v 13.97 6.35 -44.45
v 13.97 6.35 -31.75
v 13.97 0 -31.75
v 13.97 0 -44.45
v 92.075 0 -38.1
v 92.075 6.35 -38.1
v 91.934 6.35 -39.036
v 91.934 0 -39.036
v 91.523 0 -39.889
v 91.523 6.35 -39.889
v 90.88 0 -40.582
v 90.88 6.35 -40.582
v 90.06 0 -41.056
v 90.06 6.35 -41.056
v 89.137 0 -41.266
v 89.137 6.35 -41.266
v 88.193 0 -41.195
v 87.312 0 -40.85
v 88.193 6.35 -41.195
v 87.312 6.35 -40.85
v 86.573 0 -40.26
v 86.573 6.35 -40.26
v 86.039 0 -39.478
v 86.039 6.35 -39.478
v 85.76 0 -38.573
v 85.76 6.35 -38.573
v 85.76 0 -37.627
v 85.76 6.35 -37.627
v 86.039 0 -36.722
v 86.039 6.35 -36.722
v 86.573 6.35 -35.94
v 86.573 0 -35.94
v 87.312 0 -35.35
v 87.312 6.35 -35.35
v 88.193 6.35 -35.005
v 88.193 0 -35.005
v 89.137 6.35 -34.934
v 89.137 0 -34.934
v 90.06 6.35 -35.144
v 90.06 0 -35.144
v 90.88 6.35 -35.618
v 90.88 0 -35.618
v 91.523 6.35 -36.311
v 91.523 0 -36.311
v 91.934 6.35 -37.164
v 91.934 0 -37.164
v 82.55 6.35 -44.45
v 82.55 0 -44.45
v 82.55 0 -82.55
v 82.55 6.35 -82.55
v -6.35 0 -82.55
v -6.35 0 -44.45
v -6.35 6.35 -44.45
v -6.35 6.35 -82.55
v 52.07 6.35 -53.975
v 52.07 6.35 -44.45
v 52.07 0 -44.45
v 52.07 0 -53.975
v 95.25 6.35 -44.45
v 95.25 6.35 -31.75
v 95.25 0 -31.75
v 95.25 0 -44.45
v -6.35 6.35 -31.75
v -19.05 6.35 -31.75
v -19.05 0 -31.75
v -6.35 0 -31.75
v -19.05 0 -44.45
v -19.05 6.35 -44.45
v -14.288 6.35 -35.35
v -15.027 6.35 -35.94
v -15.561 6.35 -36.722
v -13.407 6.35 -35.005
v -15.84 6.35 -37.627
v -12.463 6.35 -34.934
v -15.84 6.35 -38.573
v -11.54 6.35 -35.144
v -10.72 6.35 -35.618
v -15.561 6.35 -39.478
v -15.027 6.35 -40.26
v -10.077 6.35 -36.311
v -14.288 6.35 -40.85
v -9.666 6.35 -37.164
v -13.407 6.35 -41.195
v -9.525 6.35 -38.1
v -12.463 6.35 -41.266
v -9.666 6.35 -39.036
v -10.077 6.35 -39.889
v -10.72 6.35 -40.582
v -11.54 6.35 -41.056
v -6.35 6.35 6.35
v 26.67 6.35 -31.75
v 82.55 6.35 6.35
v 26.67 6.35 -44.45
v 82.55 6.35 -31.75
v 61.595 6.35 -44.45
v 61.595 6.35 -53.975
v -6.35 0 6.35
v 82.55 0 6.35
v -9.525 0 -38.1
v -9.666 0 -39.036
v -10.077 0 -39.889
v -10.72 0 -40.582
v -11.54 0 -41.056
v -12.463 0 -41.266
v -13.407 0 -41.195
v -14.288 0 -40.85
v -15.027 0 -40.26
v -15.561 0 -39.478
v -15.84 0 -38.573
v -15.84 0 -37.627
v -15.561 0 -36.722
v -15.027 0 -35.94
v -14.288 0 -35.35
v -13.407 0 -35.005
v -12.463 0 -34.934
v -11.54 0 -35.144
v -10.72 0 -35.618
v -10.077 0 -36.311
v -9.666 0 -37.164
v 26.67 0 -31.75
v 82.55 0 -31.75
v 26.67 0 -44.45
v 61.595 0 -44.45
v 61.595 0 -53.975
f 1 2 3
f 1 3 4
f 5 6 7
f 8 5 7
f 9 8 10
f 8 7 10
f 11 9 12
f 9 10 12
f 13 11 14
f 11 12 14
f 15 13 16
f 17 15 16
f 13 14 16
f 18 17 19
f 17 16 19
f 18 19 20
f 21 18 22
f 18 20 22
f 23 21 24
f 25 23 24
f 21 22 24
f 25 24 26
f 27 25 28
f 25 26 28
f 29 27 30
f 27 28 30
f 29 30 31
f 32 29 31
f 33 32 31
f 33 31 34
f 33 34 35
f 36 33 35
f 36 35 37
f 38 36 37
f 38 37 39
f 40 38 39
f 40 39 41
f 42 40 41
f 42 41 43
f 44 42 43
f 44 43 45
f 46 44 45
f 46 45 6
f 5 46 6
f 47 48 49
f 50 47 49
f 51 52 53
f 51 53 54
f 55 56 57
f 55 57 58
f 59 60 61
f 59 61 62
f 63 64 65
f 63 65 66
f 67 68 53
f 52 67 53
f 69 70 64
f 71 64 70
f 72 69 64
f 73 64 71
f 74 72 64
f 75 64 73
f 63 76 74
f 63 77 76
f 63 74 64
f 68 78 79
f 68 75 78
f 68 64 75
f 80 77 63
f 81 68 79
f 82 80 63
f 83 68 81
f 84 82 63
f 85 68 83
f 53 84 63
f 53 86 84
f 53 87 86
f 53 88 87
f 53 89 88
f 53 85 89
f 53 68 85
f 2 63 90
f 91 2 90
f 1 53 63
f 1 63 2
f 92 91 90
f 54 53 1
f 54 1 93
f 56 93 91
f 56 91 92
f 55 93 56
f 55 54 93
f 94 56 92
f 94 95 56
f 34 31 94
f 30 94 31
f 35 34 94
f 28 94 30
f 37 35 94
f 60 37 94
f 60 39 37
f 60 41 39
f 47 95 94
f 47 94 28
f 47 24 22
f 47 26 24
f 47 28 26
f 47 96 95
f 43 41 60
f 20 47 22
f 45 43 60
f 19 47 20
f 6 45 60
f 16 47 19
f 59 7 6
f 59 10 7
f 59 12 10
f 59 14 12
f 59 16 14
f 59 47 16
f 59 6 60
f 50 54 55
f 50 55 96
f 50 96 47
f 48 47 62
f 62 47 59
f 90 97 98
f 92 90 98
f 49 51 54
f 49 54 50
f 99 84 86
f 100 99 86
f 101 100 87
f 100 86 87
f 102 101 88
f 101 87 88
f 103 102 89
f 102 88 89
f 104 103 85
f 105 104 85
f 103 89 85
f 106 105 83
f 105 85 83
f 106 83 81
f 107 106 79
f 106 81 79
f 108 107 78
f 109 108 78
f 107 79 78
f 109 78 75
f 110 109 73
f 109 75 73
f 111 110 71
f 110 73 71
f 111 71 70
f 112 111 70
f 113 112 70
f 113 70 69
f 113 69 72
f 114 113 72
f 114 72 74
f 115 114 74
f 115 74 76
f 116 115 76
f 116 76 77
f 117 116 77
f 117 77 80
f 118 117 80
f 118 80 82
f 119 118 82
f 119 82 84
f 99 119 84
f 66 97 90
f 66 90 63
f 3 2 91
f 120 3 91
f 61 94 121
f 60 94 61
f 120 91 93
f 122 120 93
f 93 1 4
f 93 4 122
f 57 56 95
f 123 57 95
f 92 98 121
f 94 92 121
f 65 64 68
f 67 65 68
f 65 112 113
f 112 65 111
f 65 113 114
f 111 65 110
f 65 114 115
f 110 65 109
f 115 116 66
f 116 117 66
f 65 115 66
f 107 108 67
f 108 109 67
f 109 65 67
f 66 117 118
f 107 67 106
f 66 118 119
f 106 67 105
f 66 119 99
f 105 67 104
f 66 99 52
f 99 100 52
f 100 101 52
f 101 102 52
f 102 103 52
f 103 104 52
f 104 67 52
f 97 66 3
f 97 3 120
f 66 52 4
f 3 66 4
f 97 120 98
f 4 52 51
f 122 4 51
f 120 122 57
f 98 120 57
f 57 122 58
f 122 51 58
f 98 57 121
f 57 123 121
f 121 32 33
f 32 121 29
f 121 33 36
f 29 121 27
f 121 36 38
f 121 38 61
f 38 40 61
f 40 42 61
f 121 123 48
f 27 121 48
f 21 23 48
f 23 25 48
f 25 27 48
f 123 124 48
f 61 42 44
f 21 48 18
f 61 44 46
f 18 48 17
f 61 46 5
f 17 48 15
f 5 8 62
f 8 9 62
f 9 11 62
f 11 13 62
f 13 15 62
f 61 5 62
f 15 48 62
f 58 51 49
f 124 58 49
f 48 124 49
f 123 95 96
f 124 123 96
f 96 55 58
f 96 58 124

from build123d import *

# Parameters (mm, degrees)
SKETCH1_W           = 88.9
SKETCH1_H           = 88.9
BOSS_EXTRUDE1_DEPTH = 6.35
SKETCH3_W           = 12.7
SKETCH3_H           = 12.7
BOSS_EXTRUDE3_DEPTH = 6.35
SKETCH4_R           = 3.175
CUT_EXTRUDE1_DEPTH  = 7.35
SKETCH6_W           = 12.7
SKETCH6_H           = 12.7
SKETCH6_W_2         = 9.525
SKETCH6_H_2         = 9.525
CUT_EXTRUDE2_DEPTH  = 6.35


with BuildPart() as part:
    # Sketch1 → Boss-Extrude1 (new body)
    with BuildSketch(Plane(origin=(0, 0, 0), x_dir=(1, 0, 0), z_dir=(0, 1, 0))):
        with Locations((38.1, 38.1)):
            Rectangle(SKETCH1_W, SKETCH1_H)
    extrude(amount=BOSS_EXTRUDE1_DEPTH)

    # Sketch3 → Boss-Extrude3 (add)
    with BuildSketch(Plane(origin=(0, 6.35, 0), x_dir=(1, 0, 0), z_dir=(0, 1, 0))):
        with Locations((88.9, 38.1)):
            Rectangle(SKETCH3_W, SKETCH3_H)
        with Locations((-12.7, 38.1)):
            Rectangle(SKETCH3_W, SKETCH3_H)
    extrude(amount=-BOSS_EXTRUDE3_DEPTH)

    # Sketch4 → Cut-Extrude1 (cut, through all)
    with BuildSketch(Plane(origin=(0, 6.35, 0), x_dir=(1, 0, 0), z_dir=(0, 1, 0))):
        with Locations((88.9, 38.1)):
            Circle(SKETCH4_R)
        with Locations((-12.7, 38.1)):
            Circle(SKETCH4_R)
    extrude(amount=-CUT_EXTRUDE1_DEPTH, mode=Mode.SUBTRACT)

    # Sketch6 → Cut-Extrude2 (cut)
    with BuildSketch(Plane(origin=(0, 6.35, 0), x_dir=(1, 0, 0), z_dir=(0, 1, 0))):
        with Locations((20.32, 38.1)):
            Rectangle(SKETCH6_W, SKETCH6_H)
        with Locations((56.8325, 49.2125)):
            Rectangle(SKETCH6_W_2, SKETCH6_H_2)
    extrude(amount=-CUT_EXTRUDE2_DEPTH, mode=Mode.SUBTRACT)


solid = part.part
